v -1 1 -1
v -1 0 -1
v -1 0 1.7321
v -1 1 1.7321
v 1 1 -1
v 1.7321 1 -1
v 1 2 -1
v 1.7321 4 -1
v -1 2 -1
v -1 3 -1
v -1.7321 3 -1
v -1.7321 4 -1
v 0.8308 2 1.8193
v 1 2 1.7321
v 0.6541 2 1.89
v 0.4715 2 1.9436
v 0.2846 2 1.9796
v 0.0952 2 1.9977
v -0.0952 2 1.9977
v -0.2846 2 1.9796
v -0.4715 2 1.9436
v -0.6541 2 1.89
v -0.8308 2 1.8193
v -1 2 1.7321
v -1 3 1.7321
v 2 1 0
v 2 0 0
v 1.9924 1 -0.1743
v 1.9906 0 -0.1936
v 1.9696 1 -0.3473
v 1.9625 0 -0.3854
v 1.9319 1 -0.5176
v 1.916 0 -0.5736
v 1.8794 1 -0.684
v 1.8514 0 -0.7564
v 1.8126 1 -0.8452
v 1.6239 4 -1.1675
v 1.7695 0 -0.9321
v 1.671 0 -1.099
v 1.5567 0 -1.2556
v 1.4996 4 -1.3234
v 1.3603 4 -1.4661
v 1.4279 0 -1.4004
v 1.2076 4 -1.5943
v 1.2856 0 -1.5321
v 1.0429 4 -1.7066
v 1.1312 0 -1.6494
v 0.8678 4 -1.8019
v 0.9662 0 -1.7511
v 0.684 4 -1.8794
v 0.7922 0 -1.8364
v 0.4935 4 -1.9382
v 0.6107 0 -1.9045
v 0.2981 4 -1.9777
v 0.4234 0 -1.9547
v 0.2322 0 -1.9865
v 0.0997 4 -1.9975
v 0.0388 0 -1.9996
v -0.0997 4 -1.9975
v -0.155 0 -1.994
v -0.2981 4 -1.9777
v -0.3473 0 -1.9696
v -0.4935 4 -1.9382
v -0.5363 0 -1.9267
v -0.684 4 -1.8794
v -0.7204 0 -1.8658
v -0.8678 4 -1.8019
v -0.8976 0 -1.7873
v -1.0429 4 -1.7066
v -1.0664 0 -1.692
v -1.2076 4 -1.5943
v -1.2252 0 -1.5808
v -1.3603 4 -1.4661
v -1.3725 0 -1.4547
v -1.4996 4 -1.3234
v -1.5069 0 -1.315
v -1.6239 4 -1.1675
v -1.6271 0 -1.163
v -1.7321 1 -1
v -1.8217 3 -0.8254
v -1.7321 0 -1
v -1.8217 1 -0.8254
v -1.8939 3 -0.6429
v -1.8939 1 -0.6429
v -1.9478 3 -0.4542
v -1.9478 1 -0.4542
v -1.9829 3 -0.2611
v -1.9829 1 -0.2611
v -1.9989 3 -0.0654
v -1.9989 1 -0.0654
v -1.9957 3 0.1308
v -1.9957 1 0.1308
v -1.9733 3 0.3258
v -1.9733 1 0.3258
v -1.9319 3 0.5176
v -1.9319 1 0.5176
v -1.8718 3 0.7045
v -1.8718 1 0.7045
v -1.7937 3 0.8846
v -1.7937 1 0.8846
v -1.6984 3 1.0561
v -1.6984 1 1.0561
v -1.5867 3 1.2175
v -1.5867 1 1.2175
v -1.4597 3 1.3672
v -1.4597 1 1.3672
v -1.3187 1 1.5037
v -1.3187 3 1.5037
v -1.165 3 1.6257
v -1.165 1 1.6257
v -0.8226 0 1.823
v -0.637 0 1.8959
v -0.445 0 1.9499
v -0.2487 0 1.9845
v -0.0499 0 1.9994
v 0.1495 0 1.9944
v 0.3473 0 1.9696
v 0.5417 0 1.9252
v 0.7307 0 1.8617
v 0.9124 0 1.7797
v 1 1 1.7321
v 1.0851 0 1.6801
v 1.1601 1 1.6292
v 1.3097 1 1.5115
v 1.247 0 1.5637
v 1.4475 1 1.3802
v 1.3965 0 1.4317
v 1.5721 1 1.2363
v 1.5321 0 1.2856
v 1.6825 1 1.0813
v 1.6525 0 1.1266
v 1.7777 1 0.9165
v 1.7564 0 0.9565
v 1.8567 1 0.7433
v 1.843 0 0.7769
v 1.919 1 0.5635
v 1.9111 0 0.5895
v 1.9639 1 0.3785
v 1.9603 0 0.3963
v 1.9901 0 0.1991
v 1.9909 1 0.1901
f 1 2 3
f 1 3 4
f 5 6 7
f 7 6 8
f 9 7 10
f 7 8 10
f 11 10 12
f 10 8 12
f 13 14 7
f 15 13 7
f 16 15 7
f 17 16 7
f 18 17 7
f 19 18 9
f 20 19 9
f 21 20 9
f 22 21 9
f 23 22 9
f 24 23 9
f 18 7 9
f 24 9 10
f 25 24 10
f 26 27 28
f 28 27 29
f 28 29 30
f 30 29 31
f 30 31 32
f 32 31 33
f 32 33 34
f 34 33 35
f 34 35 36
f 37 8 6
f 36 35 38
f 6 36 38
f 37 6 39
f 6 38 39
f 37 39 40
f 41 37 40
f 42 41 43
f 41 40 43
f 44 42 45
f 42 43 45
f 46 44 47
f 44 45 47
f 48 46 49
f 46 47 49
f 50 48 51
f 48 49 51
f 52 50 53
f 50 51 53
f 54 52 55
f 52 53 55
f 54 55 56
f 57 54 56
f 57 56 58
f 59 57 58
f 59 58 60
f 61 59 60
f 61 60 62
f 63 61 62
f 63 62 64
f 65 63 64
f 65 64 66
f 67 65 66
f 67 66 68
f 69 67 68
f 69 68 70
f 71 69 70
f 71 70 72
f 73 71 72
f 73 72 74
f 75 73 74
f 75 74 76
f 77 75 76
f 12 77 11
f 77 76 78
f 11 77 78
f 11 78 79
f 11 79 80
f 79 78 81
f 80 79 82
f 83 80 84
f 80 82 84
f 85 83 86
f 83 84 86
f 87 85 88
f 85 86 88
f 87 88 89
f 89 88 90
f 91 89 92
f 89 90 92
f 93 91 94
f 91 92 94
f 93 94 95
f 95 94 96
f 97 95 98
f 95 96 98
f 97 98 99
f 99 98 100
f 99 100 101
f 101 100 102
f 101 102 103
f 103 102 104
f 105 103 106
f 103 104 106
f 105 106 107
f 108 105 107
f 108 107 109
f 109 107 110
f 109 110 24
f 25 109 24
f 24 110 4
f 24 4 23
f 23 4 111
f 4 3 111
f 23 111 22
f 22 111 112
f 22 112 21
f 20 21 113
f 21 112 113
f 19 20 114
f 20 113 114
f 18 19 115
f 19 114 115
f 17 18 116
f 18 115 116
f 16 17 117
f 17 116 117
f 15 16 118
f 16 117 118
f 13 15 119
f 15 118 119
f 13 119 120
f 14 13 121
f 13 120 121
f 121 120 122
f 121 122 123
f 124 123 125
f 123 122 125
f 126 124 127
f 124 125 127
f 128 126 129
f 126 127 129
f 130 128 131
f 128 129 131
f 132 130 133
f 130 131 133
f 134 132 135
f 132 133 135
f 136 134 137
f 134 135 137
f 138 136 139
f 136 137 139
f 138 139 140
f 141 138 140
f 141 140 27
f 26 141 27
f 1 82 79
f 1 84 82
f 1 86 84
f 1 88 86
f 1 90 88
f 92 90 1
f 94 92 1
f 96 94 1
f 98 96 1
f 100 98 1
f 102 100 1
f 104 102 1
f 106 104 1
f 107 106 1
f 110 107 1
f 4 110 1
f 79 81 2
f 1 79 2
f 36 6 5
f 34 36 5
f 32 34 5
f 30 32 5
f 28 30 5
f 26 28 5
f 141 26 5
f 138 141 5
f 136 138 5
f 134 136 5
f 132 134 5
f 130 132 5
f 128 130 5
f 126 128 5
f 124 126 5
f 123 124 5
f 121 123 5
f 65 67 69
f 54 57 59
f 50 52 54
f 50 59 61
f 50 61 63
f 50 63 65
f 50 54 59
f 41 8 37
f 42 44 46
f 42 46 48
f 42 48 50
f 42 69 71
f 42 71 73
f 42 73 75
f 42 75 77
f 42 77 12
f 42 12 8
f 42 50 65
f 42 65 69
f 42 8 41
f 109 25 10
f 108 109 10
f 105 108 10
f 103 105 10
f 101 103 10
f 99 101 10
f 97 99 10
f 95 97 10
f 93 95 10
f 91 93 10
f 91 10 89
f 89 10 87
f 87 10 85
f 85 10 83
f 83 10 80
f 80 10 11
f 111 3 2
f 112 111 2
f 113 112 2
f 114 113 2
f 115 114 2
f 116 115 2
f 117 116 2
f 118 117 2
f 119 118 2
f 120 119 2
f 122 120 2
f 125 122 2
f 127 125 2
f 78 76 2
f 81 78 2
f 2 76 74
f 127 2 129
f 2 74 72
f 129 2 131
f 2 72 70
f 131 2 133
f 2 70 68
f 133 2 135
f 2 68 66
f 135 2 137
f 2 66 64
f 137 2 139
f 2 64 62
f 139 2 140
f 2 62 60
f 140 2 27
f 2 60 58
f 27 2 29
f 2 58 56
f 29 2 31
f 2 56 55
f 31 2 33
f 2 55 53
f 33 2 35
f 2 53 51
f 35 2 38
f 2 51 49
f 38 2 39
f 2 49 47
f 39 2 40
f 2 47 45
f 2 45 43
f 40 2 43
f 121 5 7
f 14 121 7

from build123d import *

# Parameters (mm, degrees)
SKETCH1_R               = 2
BOSS_EXTRUDE1_DEPTH     = 4
SKETCH2_W               = 1
SKETCH2_H               = 1
CUT_EXTRUDE1_DEPTH      = 3
CUT_EXTRUDE1_DEPTH_BACK = 1


with BuildPart() as part:
    # Sketch1 → Boss-Extrude1 (new body)
    with BuildSketch(Plane(origin=(0, 0, 0), x_dir=(1, 0, 0), z_dir=(0, 1, 0))):
        Circle(SKETCH1_R)
    extrude(amount=BOSS_EXTRUDE1_DEPTH)

    # Sketch2 → Cut-Extrude1 (cut, two sides)
    with BuildSketch(Plane.XY) as cut_extrude1_sk:
        Polygon((-2, 4), (2, 4), (2, 1), (1, 1), (1, 2), (-1, 2), (-1, 3), (-2, 3), align=None)
        with Locations((-1.5, 0.5)):
            Rectangle(SKETCH2_W, SKETCH2_H)
    extrude(amount=CUT_EXTRUDE1_DEPTH, mode=Mode.SUBTRACT)
    extrude(cut_extrude1_sk.sketch, amount=-CUT_EXTRUDE1_DEPTH_BACK, mode=Mode.SUBTRACT)


solid = part.part
